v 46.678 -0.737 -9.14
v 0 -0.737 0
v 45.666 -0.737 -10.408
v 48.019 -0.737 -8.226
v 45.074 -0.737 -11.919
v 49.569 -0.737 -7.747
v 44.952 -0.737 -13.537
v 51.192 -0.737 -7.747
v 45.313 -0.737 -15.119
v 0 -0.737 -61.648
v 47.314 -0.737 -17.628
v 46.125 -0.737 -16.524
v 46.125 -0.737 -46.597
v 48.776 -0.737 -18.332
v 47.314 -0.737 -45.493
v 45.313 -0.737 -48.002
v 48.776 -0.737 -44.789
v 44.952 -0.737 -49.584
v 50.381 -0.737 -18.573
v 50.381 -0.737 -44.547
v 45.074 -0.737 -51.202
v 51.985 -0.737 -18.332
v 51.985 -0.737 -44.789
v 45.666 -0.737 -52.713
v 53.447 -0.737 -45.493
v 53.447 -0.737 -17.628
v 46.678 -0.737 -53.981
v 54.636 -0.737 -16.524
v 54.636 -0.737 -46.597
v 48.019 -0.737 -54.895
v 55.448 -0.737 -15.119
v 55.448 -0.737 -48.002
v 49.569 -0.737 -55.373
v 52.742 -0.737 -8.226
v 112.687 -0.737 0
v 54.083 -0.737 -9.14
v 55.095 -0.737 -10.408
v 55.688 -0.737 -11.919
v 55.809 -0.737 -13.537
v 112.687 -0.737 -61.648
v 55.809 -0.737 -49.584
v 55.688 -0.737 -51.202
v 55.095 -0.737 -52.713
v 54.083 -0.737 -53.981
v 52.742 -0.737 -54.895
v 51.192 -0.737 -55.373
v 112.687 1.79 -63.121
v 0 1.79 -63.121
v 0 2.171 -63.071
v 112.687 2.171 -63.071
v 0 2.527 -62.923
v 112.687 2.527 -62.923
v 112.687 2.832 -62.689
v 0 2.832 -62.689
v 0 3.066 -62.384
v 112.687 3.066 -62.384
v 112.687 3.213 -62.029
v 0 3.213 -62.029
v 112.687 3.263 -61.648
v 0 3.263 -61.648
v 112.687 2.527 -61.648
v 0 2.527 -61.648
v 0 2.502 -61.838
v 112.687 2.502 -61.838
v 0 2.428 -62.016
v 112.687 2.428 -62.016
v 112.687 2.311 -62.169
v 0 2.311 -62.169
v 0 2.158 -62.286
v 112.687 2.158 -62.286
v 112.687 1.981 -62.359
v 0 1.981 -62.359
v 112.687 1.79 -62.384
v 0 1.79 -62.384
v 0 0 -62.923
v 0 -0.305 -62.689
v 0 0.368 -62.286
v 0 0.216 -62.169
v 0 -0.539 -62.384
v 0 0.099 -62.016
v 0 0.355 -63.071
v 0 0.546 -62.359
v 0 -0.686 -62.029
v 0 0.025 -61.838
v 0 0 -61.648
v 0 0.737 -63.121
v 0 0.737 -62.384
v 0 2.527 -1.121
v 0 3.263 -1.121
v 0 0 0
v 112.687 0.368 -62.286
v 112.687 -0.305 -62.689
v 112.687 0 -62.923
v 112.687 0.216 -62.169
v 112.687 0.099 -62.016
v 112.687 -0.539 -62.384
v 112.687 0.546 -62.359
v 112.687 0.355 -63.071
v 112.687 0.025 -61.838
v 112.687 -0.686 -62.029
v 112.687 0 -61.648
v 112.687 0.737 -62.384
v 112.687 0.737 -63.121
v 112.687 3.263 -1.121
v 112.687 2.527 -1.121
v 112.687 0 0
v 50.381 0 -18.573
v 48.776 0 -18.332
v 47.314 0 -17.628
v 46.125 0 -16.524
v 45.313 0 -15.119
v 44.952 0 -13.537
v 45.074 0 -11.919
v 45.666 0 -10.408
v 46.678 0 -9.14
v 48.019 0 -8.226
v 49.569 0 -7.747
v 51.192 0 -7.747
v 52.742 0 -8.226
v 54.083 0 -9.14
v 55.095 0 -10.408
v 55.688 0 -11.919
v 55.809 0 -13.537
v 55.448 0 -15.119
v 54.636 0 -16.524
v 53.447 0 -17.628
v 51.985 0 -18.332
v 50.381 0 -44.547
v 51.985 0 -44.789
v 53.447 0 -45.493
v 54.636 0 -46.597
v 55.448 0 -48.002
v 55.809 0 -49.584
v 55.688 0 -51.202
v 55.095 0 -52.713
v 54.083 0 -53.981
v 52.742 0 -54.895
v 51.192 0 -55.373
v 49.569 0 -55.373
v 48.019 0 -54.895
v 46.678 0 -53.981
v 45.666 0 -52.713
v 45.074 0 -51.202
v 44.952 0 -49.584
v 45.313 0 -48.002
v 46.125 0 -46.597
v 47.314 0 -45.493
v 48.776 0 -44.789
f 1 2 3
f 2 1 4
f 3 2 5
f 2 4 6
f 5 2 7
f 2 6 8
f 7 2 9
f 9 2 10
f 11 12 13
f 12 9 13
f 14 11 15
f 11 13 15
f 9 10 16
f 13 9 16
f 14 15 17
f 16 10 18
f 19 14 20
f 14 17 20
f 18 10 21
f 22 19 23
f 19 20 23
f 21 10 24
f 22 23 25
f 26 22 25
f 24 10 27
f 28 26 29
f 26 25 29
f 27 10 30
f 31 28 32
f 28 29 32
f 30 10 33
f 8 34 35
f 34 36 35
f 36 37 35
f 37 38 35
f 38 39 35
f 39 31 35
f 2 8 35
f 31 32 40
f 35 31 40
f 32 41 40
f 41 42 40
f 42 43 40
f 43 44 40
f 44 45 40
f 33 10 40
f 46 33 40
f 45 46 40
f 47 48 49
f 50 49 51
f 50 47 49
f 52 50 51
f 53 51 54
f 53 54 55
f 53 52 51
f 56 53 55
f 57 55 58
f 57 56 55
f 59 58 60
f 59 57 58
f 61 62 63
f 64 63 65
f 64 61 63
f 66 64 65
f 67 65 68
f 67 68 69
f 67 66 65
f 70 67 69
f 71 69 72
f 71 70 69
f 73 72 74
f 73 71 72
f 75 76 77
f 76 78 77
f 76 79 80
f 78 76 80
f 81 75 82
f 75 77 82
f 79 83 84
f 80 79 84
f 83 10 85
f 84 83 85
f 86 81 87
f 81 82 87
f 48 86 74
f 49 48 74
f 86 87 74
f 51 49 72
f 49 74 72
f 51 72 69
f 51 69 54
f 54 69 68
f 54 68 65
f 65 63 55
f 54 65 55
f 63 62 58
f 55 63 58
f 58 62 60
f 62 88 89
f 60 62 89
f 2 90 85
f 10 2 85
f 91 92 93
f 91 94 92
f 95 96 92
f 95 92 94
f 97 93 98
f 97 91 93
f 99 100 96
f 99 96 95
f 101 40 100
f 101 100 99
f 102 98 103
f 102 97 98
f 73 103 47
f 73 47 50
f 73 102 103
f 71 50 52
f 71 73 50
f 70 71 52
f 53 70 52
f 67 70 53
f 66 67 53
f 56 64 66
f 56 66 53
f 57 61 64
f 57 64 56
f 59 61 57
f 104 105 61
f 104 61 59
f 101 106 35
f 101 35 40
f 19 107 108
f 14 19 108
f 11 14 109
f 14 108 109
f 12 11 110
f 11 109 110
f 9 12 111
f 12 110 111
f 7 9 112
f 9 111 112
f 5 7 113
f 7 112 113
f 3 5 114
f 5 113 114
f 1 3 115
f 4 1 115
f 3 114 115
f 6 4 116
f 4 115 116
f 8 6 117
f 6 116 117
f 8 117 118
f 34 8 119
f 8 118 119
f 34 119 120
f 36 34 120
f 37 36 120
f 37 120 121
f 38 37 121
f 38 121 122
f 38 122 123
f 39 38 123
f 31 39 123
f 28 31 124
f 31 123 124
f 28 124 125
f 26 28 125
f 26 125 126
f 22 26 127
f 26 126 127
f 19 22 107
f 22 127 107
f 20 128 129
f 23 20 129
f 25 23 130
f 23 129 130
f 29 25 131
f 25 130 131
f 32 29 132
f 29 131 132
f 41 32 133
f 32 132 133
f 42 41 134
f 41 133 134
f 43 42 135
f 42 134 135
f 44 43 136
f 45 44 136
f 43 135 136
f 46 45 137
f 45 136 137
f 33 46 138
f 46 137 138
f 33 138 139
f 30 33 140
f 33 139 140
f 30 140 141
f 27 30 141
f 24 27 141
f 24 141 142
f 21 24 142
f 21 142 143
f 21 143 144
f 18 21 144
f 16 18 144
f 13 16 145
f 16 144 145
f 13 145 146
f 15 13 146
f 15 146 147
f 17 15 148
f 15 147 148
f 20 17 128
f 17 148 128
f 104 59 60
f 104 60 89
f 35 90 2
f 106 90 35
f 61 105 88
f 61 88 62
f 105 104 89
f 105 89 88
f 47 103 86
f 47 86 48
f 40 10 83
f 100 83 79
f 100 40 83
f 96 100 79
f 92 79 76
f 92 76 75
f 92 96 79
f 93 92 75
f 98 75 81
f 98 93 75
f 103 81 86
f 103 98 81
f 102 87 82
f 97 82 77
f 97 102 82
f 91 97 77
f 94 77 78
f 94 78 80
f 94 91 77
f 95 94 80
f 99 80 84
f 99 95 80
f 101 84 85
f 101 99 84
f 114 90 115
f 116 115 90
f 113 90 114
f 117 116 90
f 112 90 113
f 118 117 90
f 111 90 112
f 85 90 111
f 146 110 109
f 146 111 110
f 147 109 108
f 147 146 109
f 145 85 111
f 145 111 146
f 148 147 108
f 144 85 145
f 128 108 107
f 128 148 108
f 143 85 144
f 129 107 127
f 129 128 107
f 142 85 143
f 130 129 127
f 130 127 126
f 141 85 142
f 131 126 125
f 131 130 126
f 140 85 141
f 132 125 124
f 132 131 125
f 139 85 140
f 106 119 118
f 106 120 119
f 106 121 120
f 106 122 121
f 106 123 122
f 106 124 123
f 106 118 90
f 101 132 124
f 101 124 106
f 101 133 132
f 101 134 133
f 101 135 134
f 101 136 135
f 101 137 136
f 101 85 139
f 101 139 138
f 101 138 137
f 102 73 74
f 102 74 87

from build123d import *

# Parameters (mm, degrees)
SKETCH1_W                    = 112.686822752
SKETCH1_H                    = 63.120861651
SKETCH1_R                    = 5.443424695
BASE_FLANGE1_DEPTH           = 0.7366
EDGE_FLANGE1_STRIP_W         = 4.4196
EDGE_FLANGE1_STRIP_H         = 0.7366
EDGE_FLANGE1_STRIP_CUT_DEPTH = 112.686822752
EDGE_FLANGE1_DEPTH           = 112.686822752
EDGE_FLANGE2_STRIP_W         = 4.4196
EDGE_FLANGE2_STRIP_H         = 0.7366
EDGE_FLANGE2_STRIP_CUT_DEPTH = 112.686822752
EDGE_FLANGE2_DEPTH           = 112.686822752


# Sheet-metal steps are written as plain solids
with BuildPart() as part:
    # Sketch1 → Base-Flange1 (new body)
    with BuildSketch(Plane(origin=(0, 0, 0), x_dir=(1, 0, 0), z_dir=(0, 1, 0))):
        with Locations((56.343411376, 31.560430826)):
            Rectangle(SKETCH1_W, SKETCH1_H)
        with Locations(Location((50.380635498, 49.990828995, 0), (0, 0, 270))):
            Circle(SKETCH1_R, mode=Mode.SUBTRACT)
        with Locations(Location((50.380635498, 13.130032656, 0), (0, 0, 90))):
            Circle(SKETCH1_R, mode=Mode.SUBTRACT)
    extrude(amount=-BASE_FLANGE1_DEPTH)

    # Edge-Flange1 strip (across the edge) → Edge-Flange1 strip cut (cut)
    with BuildSketch(Plane(origin=(112.686822752, 0, -63.120861651), x_dir=(0, 0, 1), z_dir=(-1, 0, 0))):
        with Locations((-0.7366, -0.3683)):
            Rectangle(EDGE_FLANGE1_STRIP_W, EDGE_FLANGE1_STRIP_H)
    extrude(amount=EDGE_FLANGE1_STRIP_CUT_DEPTH, mode=Mode.SUBTRACT)

    # Edge-Flange1 section (across the edge) → Edge-Flange1 (add)
    with BuildSketch(Plane(origin=(112.686822752, 0, -63.120861651), x_dir=(0, 0, 1), z_dir=(-1, 0, 0))):
        with BuildLine():
            Line((0, 0.7366), (0, 3.2634))
            Line((0, 3.2634), (0.7366, 3.2634))
            Line((0.7366, 3.2634), (0.7366, 0.7366))
            ThreePointArc((0.7366, 0.7366), (0.952345145, 0.215745145), (1.4732, 0))
            Line((1.4732, 0), (1.4732, -0.7366))
            ThreePointArc((1.4732, -0.7366), (0.43149029, -0.30510971), (0, 0.7366))
        make_face()
    extrude(amount=EDGE_FLANGE1_DEPTH)

    # Edge-Flange2 strip (across the edge) → Edge-Flange2 strip cut (cut)
    with BuildSketch(Plane(origin=(112.686822752, 3.2634, -62.384261651), x_dir=(0, -1, 0), z_dir=(-1, 0, 0))):
        with Locations((-0.7366, -0.3683)):
            Rectangle(EDGE_FLANGE2_STRIP_W, EDGE_FLANGE2_STRIP_H)
    extrude(amount=EDGE_FLANGE2_STRIP_CUT_DEPTH, mode=Mode.SUBTRACT)

    # Edge-Flange2 section (across the edge) → Edge-Flange2 (add)
    with BuildSketch(Plane(origin=(112.686822752, 3.2634, -62.384261651), x_dir=(0, -1, 0), z_dir=(-1, 0, 0))):
        with BuildLine():
            Line((0, 0.7366), (0, 61.2634))
            Line((0, 61.2634), (0.7366, 61.2634))
            Line((0.7366, 61.2634), (0.7366, 0.7366))
            ThreePointArc((0.7366, 0.7366), (0.952345145, 0.215745145), (1.4732, 0))
            Line((1.4732, 0), (1.4732, -0.7366))
            ThreePointArc((1.4732, -0.7366), (0.43149029, -0.30510971), (0, 0.7366))
        make_face()
    extrude(amount=EDGE_FLANGE2_DEPTH)


solid = part.part
